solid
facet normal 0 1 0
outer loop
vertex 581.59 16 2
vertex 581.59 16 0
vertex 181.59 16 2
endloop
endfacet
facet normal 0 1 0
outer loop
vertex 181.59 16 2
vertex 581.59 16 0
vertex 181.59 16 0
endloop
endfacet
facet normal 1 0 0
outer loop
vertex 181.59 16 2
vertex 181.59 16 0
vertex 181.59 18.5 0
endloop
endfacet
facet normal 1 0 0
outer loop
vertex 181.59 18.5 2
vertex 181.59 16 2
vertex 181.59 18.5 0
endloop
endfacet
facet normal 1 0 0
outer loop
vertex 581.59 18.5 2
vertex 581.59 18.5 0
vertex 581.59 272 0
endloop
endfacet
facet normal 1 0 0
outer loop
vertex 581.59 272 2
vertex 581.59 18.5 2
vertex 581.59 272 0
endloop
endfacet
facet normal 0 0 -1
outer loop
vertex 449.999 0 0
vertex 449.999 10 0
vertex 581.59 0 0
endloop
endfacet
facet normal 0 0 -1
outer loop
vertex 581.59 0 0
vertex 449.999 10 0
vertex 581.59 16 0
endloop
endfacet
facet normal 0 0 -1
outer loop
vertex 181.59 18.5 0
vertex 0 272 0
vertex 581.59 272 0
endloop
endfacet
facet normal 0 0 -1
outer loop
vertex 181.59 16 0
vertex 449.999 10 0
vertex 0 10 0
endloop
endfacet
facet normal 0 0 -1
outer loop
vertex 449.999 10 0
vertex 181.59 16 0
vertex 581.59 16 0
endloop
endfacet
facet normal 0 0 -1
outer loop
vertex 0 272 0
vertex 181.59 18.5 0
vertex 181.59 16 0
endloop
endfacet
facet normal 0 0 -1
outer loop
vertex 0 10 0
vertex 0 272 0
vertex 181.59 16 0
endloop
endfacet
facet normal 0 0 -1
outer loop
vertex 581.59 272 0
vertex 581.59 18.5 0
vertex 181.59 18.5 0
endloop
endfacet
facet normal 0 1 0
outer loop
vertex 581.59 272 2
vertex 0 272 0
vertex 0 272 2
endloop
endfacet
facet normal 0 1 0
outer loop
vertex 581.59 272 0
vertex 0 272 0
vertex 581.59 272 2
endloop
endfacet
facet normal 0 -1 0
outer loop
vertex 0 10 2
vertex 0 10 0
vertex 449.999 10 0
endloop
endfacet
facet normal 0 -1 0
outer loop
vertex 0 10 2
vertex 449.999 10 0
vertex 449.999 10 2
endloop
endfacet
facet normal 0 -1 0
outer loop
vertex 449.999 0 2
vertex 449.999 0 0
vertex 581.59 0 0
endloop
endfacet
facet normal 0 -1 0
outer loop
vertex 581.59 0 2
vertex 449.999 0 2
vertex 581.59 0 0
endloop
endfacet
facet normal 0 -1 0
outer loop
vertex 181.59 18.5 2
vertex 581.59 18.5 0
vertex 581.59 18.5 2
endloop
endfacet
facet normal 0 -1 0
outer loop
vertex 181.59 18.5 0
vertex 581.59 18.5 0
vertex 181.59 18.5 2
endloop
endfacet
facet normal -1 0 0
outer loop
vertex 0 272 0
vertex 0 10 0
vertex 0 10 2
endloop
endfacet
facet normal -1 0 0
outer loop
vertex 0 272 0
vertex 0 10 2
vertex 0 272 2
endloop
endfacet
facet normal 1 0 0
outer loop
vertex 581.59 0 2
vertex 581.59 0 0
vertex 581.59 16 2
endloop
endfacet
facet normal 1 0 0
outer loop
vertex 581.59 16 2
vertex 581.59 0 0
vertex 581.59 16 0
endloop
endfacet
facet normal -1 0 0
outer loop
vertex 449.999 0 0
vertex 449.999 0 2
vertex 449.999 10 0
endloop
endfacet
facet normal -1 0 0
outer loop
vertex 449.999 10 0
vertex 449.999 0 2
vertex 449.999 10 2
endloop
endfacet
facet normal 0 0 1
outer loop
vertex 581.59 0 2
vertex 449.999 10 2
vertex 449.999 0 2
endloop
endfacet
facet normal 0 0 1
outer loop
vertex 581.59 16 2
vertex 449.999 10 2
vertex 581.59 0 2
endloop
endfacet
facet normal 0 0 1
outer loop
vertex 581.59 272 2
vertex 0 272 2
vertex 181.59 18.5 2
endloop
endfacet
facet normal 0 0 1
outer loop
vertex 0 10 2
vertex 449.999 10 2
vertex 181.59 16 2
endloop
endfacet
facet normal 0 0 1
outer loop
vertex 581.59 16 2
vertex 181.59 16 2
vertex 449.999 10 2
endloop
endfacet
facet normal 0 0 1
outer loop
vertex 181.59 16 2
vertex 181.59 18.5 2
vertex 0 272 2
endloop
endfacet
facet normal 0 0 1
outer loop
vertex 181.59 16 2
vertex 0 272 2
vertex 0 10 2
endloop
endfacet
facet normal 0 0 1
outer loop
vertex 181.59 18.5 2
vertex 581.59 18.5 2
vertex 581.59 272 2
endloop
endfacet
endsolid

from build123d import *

# Parameters (mm, degrees)
SKETCH1_W           = 581.59
SKETCH1_H           = 272
BOSS_EXTRUDE1_DEPTH = 2
SKETCH2_W           = 400
SKETCH2_H           = 2.5
CUT_EXTRUDE1_DEPTH  = 10
CAVITY2_OUTLINE_W   = 10
CAVITY2_OUTLINE_H   = 2
CAVITY2_DEPTH       = 449.999196591


# Read off the part's stored shape, not the designer's step: Cavity2
with BuildPart() as part:
    # Sketch1 → Boss-Extrude1 (new body)
    with BuildSketch(Plane.XY):
        with Locations((290.795, 136)):
            Rectangle(SKETCH1_W, SKETCH1_H)
    extrude(amount=BOSS_EXTRUDE1_DEPTH)

    # Sketch2 → Cut-Extrude1 (cut)
    with BuildSketch(Plane(origin=(0, 0, 0), x_dir=(-1, 0, 0), z_dir=(0, 0, -1))):
        with Locations((-381.59, 17.25)):
            Rectangle(SKETCH2_W, SKETCH2_H)
    extrude(amount=-CUT_EXTRUDE1_DEPTH, mode=Mode.SUBTRACT)

    # Cavity2 outline → Cavity2 (cut)
    with BuildSketch(Plane.YZ):
        with Locations((5, 1)):
            Rectangle(CAVITY2_OUTLINE_W, CAVITY2_OUTLINE_H)
    extrude(amount=CAVITY2_DEPTH, mode=Mode.SUBTRACT)


solid = part.part
